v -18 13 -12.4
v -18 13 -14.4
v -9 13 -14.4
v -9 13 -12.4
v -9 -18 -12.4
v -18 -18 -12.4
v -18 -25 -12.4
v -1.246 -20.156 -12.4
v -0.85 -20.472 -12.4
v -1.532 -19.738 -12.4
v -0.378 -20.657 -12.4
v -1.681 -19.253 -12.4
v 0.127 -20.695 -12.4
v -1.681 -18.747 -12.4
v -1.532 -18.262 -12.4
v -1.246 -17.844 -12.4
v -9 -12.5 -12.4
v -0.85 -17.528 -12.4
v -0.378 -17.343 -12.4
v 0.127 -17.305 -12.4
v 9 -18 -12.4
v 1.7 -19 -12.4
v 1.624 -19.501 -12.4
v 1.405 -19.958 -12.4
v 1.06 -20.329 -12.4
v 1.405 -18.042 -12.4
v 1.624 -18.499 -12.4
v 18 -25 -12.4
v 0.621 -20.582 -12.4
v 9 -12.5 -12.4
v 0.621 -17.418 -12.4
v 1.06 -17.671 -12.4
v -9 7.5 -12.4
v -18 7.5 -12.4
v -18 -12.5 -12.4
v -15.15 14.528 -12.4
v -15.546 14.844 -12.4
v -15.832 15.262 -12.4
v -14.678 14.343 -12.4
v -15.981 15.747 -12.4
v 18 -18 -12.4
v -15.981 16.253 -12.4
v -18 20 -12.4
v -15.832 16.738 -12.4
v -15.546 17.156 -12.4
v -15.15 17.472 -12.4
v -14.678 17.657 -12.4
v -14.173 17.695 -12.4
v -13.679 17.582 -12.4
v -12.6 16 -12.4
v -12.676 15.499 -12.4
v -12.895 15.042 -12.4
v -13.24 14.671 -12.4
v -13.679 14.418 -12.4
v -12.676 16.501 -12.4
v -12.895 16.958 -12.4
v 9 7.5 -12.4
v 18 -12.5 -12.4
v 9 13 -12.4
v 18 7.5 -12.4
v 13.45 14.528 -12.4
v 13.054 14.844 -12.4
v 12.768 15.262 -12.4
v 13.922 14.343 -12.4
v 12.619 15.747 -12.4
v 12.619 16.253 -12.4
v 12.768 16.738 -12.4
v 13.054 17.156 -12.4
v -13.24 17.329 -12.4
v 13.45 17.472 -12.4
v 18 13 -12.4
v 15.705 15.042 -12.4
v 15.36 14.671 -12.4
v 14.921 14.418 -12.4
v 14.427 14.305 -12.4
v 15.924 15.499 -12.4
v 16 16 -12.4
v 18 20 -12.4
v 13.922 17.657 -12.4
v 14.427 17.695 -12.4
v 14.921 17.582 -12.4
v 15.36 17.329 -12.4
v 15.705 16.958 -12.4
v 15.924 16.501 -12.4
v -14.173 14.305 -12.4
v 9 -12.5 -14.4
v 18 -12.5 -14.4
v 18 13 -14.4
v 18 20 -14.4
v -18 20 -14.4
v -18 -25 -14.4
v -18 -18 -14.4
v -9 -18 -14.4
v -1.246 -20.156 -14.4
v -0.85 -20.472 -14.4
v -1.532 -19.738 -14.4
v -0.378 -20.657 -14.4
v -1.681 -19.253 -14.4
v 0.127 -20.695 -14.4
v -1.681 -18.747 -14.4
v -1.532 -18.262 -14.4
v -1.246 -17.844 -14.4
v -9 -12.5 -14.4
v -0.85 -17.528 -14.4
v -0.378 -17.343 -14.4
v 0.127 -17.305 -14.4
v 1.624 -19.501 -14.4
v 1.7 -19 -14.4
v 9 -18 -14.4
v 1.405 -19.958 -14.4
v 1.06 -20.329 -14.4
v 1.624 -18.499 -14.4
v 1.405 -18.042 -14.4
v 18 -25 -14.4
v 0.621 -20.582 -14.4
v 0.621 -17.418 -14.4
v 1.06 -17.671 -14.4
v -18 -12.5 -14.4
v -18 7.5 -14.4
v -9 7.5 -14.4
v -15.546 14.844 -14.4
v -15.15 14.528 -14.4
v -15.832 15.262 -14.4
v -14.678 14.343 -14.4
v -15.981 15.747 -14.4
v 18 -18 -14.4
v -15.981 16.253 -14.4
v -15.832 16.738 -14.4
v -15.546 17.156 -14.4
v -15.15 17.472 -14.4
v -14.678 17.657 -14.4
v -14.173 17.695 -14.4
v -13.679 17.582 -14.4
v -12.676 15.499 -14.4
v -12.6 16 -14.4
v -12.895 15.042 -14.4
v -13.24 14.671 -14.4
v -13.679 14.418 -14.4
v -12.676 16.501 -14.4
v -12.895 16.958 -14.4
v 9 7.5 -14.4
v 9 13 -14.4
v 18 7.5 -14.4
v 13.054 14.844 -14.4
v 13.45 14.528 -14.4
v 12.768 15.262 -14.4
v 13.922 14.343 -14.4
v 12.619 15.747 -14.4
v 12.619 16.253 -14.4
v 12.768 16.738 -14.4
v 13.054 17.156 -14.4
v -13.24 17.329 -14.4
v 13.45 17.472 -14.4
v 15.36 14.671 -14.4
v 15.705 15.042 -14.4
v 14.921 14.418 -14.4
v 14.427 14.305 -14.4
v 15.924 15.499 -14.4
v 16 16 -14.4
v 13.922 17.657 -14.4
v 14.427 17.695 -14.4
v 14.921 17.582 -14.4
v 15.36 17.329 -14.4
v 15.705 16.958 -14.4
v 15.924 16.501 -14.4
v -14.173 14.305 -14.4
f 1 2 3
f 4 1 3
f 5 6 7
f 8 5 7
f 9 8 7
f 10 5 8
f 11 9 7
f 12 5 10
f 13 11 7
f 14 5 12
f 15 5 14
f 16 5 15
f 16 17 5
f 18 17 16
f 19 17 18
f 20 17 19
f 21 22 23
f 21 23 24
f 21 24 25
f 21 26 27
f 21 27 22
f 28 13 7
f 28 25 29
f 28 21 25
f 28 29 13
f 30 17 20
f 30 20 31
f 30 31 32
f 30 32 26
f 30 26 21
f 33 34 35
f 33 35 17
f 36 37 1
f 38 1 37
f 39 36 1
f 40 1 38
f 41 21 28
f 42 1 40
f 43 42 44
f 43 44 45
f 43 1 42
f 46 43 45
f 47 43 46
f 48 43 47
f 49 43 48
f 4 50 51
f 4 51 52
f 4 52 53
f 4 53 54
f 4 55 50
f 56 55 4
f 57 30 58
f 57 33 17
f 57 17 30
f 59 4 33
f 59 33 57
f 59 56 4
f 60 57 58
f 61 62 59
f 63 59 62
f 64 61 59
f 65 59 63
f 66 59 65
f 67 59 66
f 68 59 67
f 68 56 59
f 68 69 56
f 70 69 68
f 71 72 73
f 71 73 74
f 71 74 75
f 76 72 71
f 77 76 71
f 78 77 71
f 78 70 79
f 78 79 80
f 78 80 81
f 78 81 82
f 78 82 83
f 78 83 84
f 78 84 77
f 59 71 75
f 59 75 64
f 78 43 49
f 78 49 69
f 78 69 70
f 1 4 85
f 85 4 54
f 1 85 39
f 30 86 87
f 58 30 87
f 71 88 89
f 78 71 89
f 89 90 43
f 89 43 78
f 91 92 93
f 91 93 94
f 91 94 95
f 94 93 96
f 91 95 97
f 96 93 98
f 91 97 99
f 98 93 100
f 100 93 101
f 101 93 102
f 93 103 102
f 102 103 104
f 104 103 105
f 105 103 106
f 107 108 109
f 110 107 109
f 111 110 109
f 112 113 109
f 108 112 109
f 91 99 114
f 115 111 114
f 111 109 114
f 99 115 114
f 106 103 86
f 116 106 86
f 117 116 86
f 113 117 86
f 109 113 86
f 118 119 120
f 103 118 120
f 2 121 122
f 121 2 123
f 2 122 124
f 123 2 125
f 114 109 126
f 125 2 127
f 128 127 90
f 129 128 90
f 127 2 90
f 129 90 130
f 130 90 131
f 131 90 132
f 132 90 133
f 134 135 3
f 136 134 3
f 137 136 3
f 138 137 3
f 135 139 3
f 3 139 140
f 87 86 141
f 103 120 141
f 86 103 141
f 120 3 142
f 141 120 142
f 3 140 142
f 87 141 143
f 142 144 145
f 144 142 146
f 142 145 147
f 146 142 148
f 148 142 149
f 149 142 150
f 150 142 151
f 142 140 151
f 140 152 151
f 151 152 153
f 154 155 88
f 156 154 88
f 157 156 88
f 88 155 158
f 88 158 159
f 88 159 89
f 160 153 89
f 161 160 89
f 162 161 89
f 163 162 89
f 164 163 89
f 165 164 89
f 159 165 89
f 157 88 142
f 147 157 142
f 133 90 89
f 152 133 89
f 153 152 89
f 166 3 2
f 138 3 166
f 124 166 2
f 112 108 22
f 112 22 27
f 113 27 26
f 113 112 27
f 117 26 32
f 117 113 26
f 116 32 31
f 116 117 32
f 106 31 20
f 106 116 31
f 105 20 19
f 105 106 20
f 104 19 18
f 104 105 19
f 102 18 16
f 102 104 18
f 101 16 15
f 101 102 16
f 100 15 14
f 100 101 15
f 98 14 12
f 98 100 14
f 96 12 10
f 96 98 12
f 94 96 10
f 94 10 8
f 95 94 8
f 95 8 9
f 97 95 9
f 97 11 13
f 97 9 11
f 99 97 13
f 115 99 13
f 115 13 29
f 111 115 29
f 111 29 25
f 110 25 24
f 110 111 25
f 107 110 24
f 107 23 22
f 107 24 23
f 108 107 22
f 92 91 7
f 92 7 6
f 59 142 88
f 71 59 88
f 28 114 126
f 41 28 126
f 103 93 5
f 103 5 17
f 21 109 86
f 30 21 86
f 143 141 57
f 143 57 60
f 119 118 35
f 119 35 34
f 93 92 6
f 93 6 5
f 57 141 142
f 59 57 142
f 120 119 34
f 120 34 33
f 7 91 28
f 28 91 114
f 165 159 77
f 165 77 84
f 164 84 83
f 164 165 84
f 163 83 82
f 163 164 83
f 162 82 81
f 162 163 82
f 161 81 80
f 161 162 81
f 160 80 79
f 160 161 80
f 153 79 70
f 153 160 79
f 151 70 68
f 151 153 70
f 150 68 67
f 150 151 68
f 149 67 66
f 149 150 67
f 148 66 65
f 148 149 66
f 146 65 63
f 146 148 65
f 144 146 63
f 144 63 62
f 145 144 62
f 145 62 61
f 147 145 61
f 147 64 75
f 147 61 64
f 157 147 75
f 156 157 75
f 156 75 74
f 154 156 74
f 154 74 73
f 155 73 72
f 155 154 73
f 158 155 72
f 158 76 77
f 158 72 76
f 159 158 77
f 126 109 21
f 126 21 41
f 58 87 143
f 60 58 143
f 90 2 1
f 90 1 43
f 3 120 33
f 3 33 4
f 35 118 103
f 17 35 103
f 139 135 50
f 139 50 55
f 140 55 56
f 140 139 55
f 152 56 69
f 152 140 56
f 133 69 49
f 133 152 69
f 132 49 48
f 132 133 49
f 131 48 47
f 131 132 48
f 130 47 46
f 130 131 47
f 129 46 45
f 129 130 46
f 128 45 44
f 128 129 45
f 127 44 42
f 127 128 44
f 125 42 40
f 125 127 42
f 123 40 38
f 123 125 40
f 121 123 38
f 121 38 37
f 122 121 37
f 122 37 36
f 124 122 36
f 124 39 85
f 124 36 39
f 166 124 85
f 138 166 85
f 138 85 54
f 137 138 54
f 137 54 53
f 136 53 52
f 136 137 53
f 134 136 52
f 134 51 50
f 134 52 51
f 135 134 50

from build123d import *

# Parameters (mm, degrees)
SKETCH025_R  = 1.7
PAD021_DEPTH = 100
BOX004_W     = 36
BOX004_H     = 7
BOX004_DEPTH = 2
BOX003_W     = 18
BOX003_H     = 45
BOX003_DEPTH = 2
BOX005_W     = 36
BOX005_H     = 7
BOX005_DEPTH = 2
BOX002_W     = 36
BOX002_H     = 20
BOX002_DEPTH = 2


with BuildPart() as pad021:
    # Sketch025 → Pad021 (new body)
    with BuildSketch(Plane.XY.offset(-50)):
        with Locations((0, -19)):
            Circle(SKETCH025_R)
        with Locations((-14.3, 16)):
            Circle(SKETCH025_R)
        with Locations((14.3, 16)):
            Circle(SKETCH025_R)
    extrude(amount=PAD021_DEPTH)


with BuildPart() as chassis003:
    # Box004 → Box004 (new body)
    with BuildSketch(Plane(origin=(-18, 13, -14.4), x_dir=(1, 0, 0), z_dir=(0, 0, 1))):
        with Locations((18, 3.5)):
            Rectangle(BOX004_W, BOX004_H)
    extrude(amount=BOX004_DEPTH)


with BuildPart() as chassis002:
    # Box003 → Box003 (new body)
    with BuildSketch(Plane(origin=(-9, -25, -14.4), x_dir=(1, 0, 0), z_dir=(0, 0, 1))):
        with Locations((9, 22.5)):
            Rectangle(BOX003_W, BOX003_H)
    extrude(amount=BOX003_DEPTH)


with BuildPart() as chassis004:
    # Box005 → Box005 (new body)
    with BuildSketch(Plane(origin=(-18, -25, -14.4), x_dir=(1, 0, 0), z_dir=(0, 0, 1))):
        with Locations((18, 3.5)):
            Rectangle(BOX005_W, BOX005_H)
    extrude(amount=BOX005_DEPTH)


with BuildPart() as cut005:
    # Box002 → Box002 (new body)
    with BuildSketch(Plane(origin=(-18, -12.5, -14.4), x_dir=(1, 0, 0), z_dir=(0, 0, 1))):
        with Locations((18, 10)):
            Rectangle(BOX002_W, BOX002_H)
    extrude(amount=BOX002_DEPTH)

    # Fusion002: union chassis003, chassis002, chassis004
    add(chassis003.part)
    add(chassis002.part)
    add(chassis004.part)

    # Cut005: cut Pad021
    add(pad021.part, mode=Mode.SUBTRACT)


solid = cut005.part
